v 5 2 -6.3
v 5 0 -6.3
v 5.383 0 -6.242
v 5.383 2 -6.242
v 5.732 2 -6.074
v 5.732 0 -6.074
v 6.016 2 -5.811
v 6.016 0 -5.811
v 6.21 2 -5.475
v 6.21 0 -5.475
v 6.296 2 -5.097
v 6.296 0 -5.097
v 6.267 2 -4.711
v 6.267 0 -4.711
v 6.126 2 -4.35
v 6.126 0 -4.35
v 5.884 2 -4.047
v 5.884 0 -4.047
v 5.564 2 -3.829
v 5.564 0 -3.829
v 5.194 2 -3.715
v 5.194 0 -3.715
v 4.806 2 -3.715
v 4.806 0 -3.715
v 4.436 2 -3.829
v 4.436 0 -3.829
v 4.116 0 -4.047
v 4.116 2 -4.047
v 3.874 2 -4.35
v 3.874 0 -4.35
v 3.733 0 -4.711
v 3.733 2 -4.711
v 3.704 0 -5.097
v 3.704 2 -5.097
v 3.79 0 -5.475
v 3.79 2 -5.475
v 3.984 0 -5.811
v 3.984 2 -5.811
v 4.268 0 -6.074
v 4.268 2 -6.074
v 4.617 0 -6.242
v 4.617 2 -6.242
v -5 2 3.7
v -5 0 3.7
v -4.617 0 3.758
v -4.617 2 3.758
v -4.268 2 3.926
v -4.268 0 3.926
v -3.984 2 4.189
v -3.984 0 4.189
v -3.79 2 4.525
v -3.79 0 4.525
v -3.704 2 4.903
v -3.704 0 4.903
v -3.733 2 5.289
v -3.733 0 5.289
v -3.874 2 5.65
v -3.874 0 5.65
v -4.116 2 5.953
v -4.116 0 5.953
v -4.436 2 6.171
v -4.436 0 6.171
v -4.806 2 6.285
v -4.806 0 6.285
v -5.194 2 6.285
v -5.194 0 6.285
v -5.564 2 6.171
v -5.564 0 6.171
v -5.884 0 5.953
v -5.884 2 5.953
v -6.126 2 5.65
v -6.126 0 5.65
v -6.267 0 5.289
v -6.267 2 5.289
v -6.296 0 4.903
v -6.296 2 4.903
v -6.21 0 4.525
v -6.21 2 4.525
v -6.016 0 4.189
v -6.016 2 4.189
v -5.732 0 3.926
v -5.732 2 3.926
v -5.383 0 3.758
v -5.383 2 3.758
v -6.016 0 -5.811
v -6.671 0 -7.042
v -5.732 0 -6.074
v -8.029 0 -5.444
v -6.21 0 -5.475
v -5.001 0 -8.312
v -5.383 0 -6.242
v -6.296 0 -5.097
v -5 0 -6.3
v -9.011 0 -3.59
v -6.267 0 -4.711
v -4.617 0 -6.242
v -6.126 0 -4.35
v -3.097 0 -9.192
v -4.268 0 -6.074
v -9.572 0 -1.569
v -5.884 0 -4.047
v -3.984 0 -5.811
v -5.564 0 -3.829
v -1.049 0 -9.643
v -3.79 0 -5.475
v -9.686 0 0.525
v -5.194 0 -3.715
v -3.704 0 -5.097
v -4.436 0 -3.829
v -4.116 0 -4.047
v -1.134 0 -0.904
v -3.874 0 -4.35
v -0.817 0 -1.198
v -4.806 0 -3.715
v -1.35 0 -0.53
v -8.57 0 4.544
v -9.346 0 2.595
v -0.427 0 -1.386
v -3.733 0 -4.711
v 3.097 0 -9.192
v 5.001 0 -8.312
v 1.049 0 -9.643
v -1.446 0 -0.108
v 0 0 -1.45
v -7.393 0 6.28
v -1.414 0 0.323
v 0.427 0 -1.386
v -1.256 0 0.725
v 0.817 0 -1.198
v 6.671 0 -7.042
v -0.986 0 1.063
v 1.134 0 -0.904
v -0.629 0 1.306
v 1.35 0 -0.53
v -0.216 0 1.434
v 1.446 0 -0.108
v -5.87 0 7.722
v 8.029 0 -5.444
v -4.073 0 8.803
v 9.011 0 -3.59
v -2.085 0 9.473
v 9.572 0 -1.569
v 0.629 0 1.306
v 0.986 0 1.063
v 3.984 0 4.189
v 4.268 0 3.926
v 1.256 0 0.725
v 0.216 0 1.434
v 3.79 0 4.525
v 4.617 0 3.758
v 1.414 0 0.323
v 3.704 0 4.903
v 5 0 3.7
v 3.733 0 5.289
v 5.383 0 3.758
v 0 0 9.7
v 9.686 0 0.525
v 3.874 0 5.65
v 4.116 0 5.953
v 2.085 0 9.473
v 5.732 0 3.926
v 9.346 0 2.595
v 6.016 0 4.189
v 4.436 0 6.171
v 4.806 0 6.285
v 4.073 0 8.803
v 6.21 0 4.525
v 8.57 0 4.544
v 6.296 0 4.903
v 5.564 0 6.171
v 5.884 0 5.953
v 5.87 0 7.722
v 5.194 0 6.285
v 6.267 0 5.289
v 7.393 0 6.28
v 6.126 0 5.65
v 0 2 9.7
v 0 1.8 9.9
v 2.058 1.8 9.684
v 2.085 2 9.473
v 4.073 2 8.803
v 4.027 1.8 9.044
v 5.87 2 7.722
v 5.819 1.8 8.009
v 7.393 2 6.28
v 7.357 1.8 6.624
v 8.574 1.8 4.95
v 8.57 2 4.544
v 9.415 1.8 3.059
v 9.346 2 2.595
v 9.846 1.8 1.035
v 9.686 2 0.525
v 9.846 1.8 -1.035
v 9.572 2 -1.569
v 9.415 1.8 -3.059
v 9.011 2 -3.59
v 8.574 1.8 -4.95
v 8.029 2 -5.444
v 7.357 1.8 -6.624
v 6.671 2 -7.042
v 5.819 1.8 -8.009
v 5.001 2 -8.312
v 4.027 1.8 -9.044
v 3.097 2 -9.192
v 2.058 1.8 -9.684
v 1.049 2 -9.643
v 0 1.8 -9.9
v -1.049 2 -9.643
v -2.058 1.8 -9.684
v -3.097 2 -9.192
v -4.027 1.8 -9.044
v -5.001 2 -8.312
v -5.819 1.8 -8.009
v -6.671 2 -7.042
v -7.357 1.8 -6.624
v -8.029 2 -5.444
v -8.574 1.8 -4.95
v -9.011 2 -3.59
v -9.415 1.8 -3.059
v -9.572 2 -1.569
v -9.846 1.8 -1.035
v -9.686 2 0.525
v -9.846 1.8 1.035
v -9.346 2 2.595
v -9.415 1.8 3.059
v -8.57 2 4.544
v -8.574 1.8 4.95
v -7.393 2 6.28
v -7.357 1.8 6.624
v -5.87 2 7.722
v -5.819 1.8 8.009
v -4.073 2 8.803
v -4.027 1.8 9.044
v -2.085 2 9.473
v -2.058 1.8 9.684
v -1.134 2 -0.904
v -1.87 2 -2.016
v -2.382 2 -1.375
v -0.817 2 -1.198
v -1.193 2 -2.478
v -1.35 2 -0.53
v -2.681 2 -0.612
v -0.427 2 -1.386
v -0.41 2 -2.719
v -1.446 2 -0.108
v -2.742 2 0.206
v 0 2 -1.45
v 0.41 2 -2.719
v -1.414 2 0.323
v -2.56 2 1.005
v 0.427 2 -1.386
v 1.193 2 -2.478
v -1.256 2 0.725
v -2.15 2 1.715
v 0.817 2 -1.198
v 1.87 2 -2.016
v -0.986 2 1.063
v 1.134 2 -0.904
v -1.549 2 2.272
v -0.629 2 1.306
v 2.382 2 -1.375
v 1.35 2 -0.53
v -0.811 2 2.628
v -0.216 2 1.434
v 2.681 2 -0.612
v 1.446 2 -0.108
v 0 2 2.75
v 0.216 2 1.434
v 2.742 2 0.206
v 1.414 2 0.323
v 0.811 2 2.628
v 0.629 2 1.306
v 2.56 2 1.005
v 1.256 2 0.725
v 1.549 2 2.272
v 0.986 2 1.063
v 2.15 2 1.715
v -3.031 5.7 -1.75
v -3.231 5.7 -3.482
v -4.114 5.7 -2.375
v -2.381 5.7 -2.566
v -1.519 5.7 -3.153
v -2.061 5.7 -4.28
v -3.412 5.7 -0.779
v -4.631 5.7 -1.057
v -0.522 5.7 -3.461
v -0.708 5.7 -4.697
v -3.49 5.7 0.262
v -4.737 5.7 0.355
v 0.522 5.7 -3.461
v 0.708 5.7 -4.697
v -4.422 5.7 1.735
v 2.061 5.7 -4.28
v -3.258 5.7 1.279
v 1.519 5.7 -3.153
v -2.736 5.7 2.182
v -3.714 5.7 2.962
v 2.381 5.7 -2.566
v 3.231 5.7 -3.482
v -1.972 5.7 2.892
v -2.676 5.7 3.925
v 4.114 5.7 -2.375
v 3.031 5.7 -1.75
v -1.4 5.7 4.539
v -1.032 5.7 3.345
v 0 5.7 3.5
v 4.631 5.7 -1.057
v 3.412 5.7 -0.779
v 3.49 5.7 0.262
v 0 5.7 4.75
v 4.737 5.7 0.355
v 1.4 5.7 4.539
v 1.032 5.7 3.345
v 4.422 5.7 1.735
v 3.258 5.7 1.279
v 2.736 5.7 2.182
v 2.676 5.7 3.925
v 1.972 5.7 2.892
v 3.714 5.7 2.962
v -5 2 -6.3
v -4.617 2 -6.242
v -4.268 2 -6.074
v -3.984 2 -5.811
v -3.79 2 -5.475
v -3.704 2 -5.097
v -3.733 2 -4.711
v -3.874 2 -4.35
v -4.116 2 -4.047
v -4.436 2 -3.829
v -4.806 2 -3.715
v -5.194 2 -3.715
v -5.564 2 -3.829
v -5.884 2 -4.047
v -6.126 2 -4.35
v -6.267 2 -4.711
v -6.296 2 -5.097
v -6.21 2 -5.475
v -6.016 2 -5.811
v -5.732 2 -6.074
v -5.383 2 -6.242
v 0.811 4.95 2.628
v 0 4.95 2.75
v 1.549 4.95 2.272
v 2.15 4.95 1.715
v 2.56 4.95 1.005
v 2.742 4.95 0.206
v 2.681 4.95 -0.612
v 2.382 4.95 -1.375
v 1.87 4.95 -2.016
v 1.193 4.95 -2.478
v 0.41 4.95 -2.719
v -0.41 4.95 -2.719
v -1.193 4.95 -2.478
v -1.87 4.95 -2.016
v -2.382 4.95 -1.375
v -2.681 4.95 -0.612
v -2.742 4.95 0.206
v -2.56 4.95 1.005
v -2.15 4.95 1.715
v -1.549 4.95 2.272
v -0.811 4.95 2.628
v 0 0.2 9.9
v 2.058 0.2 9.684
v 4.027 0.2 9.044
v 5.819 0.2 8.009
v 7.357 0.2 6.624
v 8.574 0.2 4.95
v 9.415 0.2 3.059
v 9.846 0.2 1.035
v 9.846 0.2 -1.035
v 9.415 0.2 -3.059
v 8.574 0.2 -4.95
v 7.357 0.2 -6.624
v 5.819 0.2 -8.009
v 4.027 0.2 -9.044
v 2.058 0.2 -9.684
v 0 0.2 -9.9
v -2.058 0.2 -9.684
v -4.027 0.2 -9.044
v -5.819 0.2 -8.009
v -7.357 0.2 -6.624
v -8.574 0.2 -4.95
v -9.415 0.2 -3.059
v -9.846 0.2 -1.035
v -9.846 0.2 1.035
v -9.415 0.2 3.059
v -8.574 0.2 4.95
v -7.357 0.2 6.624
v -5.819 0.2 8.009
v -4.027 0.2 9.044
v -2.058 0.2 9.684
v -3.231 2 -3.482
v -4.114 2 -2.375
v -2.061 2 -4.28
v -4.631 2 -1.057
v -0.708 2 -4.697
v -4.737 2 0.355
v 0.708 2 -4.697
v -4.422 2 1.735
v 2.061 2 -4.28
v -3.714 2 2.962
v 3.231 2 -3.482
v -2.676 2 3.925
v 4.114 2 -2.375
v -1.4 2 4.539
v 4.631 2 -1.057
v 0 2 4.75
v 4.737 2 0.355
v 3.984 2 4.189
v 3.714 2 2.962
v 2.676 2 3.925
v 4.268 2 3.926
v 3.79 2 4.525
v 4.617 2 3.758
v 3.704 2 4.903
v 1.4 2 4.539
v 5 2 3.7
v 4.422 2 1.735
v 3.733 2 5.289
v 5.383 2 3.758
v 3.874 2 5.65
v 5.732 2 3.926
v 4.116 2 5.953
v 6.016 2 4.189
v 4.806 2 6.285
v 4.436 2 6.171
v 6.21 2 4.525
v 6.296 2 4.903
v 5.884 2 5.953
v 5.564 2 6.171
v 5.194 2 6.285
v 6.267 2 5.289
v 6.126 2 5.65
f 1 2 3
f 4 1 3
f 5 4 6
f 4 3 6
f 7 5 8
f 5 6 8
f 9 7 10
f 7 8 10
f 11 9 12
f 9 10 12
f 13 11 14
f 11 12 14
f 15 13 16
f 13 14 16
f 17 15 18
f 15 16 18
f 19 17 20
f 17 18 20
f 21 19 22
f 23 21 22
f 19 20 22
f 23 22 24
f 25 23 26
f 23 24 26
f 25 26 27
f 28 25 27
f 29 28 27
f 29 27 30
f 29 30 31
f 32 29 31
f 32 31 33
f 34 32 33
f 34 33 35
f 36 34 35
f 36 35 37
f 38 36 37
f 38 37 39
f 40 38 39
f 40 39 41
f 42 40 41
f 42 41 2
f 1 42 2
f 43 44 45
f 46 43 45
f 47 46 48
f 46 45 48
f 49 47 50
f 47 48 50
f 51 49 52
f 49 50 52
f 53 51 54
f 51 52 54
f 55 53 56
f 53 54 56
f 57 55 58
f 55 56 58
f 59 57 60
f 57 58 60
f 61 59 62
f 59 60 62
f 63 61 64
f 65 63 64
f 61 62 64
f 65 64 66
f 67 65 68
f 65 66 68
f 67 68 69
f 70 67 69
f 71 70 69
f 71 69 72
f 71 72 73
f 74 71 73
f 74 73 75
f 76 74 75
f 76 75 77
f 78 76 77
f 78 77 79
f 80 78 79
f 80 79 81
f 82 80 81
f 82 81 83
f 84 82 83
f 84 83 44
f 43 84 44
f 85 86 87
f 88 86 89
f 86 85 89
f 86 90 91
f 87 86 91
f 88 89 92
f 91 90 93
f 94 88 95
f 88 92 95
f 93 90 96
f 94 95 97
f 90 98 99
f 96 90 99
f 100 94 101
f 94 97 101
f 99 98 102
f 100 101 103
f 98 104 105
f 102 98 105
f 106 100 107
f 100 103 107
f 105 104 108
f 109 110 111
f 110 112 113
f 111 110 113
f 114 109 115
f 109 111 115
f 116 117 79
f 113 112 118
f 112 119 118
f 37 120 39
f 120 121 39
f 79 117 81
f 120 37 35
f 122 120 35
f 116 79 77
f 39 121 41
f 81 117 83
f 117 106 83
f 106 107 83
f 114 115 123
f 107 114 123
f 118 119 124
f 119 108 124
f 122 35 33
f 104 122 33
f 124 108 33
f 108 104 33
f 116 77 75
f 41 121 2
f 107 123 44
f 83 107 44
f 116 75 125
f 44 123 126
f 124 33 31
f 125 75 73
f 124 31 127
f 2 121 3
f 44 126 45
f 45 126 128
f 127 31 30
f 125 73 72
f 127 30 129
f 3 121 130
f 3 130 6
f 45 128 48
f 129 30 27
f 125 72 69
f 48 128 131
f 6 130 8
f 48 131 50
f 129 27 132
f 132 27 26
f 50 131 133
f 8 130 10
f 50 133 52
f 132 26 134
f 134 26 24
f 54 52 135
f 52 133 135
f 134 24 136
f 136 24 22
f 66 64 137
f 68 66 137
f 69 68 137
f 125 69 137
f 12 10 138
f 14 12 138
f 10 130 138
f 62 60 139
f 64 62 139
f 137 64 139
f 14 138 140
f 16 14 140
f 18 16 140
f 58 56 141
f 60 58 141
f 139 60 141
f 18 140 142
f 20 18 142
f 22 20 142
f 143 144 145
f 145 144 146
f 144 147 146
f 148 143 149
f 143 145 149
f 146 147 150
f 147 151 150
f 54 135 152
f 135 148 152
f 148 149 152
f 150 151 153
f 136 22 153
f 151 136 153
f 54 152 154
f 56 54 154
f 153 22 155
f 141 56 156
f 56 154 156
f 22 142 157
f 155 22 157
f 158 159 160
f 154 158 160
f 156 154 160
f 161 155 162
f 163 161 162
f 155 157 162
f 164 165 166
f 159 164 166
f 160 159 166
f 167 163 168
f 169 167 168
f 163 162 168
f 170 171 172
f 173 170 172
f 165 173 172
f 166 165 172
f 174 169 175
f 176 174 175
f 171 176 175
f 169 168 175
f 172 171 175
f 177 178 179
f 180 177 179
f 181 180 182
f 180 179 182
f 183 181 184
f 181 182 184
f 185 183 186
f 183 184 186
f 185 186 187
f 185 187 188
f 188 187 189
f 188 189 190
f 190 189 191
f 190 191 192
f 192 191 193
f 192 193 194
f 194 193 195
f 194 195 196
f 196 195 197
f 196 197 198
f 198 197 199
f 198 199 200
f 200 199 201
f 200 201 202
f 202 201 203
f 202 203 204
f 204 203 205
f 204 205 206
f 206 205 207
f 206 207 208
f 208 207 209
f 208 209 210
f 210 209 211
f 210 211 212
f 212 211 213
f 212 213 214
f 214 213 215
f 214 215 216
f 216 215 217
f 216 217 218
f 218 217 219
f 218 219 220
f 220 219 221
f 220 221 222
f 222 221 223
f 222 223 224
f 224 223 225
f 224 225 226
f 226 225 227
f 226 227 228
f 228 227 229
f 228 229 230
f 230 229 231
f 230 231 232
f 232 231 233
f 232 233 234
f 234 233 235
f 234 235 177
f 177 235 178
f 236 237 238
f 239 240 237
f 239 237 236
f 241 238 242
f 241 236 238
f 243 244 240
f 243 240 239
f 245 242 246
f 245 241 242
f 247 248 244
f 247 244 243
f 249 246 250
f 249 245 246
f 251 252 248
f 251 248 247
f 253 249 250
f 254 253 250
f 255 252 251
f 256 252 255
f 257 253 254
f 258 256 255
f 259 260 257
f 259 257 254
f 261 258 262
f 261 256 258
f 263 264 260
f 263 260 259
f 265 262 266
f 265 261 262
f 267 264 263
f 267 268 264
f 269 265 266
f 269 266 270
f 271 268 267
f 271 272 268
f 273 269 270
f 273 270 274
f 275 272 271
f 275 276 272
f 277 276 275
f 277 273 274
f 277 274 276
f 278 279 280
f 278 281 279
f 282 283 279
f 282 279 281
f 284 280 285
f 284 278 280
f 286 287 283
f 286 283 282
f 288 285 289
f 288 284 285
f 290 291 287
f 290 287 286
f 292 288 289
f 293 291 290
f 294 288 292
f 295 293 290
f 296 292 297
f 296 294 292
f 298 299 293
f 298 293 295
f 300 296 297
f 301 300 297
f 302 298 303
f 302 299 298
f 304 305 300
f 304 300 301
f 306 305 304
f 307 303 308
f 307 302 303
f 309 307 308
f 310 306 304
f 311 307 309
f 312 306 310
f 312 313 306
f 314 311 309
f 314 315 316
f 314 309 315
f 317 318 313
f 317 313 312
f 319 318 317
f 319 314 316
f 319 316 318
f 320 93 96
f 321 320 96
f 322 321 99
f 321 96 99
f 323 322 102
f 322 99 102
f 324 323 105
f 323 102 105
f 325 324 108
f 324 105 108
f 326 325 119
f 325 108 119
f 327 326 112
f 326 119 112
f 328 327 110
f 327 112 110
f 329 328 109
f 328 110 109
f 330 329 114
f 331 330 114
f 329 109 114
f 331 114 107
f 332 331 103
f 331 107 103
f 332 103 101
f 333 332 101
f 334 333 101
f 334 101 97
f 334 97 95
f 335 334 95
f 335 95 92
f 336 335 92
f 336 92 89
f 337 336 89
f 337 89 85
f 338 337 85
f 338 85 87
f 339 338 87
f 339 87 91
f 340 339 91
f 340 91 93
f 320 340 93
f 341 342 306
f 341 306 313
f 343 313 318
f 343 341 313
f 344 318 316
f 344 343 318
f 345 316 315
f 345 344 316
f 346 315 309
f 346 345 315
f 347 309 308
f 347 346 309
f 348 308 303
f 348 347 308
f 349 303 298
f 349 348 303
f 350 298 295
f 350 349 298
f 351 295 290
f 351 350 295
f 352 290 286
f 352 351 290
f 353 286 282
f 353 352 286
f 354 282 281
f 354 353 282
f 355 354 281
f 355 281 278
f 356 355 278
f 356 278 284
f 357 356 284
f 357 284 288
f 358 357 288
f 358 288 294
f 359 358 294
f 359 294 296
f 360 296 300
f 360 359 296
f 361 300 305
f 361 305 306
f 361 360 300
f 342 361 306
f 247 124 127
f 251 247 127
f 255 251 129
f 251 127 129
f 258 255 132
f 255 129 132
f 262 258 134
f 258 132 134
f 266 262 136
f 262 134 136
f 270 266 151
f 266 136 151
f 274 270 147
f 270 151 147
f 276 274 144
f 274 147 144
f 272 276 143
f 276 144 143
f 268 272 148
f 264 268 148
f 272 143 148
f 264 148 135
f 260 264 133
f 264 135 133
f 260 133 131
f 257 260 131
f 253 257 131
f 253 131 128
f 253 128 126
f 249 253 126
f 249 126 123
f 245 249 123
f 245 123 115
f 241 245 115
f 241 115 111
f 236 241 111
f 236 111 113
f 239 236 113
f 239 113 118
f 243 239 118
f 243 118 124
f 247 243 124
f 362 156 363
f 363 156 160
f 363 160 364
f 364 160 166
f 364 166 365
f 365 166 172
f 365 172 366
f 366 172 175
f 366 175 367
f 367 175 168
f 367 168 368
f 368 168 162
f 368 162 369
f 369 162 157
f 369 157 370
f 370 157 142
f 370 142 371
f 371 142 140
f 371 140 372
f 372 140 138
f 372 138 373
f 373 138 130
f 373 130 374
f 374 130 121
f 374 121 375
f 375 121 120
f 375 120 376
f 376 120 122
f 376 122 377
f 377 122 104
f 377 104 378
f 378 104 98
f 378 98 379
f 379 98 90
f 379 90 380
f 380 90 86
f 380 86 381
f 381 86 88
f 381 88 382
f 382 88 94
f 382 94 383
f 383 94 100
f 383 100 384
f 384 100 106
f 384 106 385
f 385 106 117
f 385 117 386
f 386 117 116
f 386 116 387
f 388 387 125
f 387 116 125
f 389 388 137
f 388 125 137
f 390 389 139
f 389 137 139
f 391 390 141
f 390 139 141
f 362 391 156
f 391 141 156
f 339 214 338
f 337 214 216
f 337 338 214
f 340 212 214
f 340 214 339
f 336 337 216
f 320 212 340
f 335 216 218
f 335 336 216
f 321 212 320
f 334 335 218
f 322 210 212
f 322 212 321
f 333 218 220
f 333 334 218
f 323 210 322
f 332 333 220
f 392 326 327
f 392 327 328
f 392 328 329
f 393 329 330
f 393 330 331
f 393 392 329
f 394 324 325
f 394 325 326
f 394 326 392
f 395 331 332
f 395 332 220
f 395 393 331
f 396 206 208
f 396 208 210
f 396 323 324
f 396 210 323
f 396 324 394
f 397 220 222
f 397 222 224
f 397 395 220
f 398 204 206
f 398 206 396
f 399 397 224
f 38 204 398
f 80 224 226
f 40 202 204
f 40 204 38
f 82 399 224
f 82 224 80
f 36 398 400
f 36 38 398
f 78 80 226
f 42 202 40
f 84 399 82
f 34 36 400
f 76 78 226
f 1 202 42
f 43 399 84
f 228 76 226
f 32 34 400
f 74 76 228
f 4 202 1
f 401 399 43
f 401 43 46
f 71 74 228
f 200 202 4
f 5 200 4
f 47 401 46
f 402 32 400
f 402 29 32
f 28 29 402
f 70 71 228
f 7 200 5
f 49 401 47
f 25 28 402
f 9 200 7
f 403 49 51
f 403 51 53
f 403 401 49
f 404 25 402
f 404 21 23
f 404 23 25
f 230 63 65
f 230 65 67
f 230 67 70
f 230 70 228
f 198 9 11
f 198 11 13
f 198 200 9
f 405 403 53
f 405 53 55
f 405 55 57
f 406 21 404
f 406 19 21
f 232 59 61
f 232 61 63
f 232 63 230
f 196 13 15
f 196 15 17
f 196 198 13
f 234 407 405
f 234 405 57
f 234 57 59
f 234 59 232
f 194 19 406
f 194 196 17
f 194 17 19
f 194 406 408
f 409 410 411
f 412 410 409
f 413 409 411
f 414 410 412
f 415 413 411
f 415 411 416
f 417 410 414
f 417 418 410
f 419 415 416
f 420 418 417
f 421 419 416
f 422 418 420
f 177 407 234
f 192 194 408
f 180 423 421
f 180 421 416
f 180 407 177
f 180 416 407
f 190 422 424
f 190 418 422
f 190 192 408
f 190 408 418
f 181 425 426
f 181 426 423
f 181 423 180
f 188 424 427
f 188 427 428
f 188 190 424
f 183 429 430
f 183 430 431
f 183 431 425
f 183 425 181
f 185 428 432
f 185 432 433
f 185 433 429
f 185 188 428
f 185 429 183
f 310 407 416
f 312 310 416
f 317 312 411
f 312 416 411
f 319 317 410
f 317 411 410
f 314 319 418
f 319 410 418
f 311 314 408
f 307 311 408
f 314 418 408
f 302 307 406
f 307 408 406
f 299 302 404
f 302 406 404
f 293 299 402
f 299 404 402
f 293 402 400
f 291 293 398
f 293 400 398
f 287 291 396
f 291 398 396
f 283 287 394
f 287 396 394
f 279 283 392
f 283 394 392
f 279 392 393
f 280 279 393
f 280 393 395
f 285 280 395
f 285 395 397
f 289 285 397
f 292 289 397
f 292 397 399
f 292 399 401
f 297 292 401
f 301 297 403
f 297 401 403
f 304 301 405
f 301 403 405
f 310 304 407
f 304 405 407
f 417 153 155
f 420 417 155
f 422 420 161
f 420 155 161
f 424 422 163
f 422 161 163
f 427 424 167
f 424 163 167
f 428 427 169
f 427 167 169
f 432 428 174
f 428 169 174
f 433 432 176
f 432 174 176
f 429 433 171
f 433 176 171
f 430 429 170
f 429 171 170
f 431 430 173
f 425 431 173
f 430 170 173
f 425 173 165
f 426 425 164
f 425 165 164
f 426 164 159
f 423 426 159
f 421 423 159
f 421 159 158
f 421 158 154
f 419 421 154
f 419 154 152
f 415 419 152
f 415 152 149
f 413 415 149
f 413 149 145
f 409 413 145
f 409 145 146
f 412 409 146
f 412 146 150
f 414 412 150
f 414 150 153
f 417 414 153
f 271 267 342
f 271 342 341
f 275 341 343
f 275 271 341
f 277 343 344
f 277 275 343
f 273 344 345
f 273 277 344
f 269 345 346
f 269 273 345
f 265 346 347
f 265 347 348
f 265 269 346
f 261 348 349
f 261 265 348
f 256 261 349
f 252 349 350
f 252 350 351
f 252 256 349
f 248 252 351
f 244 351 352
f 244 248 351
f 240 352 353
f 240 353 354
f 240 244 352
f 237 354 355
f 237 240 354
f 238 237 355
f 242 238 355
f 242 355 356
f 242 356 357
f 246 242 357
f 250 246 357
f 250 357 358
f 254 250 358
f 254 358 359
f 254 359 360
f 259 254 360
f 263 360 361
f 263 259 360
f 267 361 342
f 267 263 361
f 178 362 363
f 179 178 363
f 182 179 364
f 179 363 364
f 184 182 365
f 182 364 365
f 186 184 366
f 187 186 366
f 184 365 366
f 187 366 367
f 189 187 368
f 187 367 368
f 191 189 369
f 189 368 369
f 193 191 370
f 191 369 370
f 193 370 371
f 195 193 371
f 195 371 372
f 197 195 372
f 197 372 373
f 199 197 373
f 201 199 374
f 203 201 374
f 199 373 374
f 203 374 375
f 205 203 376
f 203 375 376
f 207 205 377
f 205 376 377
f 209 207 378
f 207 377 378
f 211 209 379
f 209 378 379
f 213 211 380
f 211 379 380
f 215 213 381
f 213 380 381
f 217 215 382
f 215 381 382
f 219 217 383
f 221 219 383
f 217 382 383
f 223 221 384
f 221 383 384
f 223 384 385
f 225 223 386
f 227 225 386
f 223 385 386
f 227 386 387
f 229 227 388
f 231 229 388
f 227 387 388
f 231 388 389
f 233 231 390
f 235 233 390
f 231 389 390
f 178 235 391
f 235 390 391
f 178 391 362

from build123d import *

# Parameters (mm, degrees)
SKETCH1_R           = 9.9
BOSS_EXTRUDE1_DEPTH = 2
SKETCH2_R           = 4.75
SKETCH2_R_2         = 2.75
BOSS_EXTRUDE2_DEPTH = 3.7
CUT_EXTRUDE1_REACH  = 17.117
SKETCH3_R           = 1.3
SKETCH3_R_2         = 1.45
CHAMFER1_SIZE       = 0.75
CHAMFER2_SIZE       = 0.2


with BuildPart() as part:
    # Sketch1 → Boss-Extrude1 (new body)
    with BuildSketch(Plane(origin=(0, 0, 0), x_dir=(1, 0, 0), z_dir=(0, 1, 0))):
        with Locations(Location((0, 0, 0), (0, 0, 270))):
            Circle(SKETCH1_R)
    extrude(amount=BOSS_EXTRUDE1_DEPTH)

    # Sketch2 → Boss-Extrude2 (add)
    with BuildSketch(Plane(origin=(0, 2, 0), x_dir=(1, 0, 0), z_dir=(0, 1, 0))):
        with Locations(Location((0, 0, 0), (0, 0, 270))):
            Circle(SKETCH2_R)
        with Locations(Location((0, 0, 0), (0, 0, 270))):
            Circle(SKETCH2_R_2, mode=Mode.SUBTRACT)
    extrude(amount=BOSS_EXTRUDE2_DEPTH)

    # Sketch3 → Cut-Extrude1 (cut, up to next)
    with BuildSketch(Plane.XZ, mode=Mode.PRIVATE) as cut_extrude1_sk1:
        with Locations(Location((-5, 5, 0), (0, 0, 270))):
            Circle(SKETCH3_R)
    cut_extrude1_tool1 = extrude(cut_extrude1_sk1.sketch, amount=-CUT_EXTRUDE1_REACH, mode=Mode.PRIVATE) & part.part
    # Sketch3 → Cut-Extrude1 (cut, up to next)
    with BuildSketch(Plane.XZ, mode=Mode.PRIVATE) as cut_extrude1_sk2:
        with Locations(Location((5, 5, 0), (0, 0, 270))):
            Circle(SKETCH3_R)
    cut_extrude1_tool2 = extrude(cut_extrude1_sk2.sketch, amount=-CUT_EXTRUDE1_REACH, mode=Mode.PRIVATE) & part.part
    # Sketch3 → Cut-Extrude1 (cut, up to next)
    with BuildSketch(Plane.XZ, mode=Mode.PRIVATE) as cut_extrude1_sk3:
        with Locations(Location((-5, -5, 0), (0, 0, 270))):
            Circle(SKETCH3_R)
    cut_extrude1_tool3 = extrude(cut_extrude1_sk3.sketch, amount=-CUT_EXTRUDE1_REACH, mode=Mode.PRIVATE) & part.part
    # Sketch3 → Cut-Extrude1 (cut, up to next)
    with BuildSketch(Plane.XZ, mode=Mode.PRIVATE) as cut_extrude1_sk4:
        with Locations(Location((5, -5, 0), (0, 0, 270))):
            Circle(SKETCH3_R)
    cut_extrude1_tool4 = extrude(cut_extrude1_sk4.sketch, amount=-CUT_EXTRUDE1_REACH, mode=Mode.PRIVATE) & part.part
    # Sketch3 → Cut-Extrude1 (cut, up to next)
    with BuildSketch(Plane.XZ, mode=Mode.PRIVATE) as cut_extrude1_sk5:
        with Locations(Location((0, 0, 0), (0, 0, 270))):
            Circle(SKETCH3_R_2)
    cut_extrude1_tool5 = extrude(cut_extrude1_sk5.sketch, amount=-CUT_EXTRUDE1_REACH, mode=Mode.PRIVATE) & part.part
    add(cut_extrude1_tool1.solids().sort_by_distance((-5, 0, 5))[0], mode=Mode.SUBTRACT)
    add(cut_extrude1_tool2.solids().sort_by_distance((5, 0, 5))[0], mode=Mode.SUBTRACT)
    add(cut_extrude1_tool3.solids().sort_by_distance((-5, 0, -5))[0], mode=Mode.SUBTRACT)
    add(cut_extrude1_tool4.solids().sort_by_distance((5, 0, -5))[0], mode=Mode.SUBTRACT)
    add(cut_extrude1_tool5.solids().sort_by_distance((0, 0, 0))[0], mode=Mode.SUBTRACT)

    # Chamfer1
    chamfer1_edges = [part.edges().sort_by_distance(p)[0] for p in [
        (0, 5.7, -2.75),
    ]]
    chamfer(chamfer1_edges, length=CHAMFER1_SIZE)

    # Chamfer2
    chamfer2_edges = [part.edges().sort_by_distance(p)[0] for p in [
        (0, 0, -9.9),
        (0, 2, -9.9),
    ]]
    chamfer(chamfer2_edges, length=CHAMFER2_SIZE)


solid = part.part
